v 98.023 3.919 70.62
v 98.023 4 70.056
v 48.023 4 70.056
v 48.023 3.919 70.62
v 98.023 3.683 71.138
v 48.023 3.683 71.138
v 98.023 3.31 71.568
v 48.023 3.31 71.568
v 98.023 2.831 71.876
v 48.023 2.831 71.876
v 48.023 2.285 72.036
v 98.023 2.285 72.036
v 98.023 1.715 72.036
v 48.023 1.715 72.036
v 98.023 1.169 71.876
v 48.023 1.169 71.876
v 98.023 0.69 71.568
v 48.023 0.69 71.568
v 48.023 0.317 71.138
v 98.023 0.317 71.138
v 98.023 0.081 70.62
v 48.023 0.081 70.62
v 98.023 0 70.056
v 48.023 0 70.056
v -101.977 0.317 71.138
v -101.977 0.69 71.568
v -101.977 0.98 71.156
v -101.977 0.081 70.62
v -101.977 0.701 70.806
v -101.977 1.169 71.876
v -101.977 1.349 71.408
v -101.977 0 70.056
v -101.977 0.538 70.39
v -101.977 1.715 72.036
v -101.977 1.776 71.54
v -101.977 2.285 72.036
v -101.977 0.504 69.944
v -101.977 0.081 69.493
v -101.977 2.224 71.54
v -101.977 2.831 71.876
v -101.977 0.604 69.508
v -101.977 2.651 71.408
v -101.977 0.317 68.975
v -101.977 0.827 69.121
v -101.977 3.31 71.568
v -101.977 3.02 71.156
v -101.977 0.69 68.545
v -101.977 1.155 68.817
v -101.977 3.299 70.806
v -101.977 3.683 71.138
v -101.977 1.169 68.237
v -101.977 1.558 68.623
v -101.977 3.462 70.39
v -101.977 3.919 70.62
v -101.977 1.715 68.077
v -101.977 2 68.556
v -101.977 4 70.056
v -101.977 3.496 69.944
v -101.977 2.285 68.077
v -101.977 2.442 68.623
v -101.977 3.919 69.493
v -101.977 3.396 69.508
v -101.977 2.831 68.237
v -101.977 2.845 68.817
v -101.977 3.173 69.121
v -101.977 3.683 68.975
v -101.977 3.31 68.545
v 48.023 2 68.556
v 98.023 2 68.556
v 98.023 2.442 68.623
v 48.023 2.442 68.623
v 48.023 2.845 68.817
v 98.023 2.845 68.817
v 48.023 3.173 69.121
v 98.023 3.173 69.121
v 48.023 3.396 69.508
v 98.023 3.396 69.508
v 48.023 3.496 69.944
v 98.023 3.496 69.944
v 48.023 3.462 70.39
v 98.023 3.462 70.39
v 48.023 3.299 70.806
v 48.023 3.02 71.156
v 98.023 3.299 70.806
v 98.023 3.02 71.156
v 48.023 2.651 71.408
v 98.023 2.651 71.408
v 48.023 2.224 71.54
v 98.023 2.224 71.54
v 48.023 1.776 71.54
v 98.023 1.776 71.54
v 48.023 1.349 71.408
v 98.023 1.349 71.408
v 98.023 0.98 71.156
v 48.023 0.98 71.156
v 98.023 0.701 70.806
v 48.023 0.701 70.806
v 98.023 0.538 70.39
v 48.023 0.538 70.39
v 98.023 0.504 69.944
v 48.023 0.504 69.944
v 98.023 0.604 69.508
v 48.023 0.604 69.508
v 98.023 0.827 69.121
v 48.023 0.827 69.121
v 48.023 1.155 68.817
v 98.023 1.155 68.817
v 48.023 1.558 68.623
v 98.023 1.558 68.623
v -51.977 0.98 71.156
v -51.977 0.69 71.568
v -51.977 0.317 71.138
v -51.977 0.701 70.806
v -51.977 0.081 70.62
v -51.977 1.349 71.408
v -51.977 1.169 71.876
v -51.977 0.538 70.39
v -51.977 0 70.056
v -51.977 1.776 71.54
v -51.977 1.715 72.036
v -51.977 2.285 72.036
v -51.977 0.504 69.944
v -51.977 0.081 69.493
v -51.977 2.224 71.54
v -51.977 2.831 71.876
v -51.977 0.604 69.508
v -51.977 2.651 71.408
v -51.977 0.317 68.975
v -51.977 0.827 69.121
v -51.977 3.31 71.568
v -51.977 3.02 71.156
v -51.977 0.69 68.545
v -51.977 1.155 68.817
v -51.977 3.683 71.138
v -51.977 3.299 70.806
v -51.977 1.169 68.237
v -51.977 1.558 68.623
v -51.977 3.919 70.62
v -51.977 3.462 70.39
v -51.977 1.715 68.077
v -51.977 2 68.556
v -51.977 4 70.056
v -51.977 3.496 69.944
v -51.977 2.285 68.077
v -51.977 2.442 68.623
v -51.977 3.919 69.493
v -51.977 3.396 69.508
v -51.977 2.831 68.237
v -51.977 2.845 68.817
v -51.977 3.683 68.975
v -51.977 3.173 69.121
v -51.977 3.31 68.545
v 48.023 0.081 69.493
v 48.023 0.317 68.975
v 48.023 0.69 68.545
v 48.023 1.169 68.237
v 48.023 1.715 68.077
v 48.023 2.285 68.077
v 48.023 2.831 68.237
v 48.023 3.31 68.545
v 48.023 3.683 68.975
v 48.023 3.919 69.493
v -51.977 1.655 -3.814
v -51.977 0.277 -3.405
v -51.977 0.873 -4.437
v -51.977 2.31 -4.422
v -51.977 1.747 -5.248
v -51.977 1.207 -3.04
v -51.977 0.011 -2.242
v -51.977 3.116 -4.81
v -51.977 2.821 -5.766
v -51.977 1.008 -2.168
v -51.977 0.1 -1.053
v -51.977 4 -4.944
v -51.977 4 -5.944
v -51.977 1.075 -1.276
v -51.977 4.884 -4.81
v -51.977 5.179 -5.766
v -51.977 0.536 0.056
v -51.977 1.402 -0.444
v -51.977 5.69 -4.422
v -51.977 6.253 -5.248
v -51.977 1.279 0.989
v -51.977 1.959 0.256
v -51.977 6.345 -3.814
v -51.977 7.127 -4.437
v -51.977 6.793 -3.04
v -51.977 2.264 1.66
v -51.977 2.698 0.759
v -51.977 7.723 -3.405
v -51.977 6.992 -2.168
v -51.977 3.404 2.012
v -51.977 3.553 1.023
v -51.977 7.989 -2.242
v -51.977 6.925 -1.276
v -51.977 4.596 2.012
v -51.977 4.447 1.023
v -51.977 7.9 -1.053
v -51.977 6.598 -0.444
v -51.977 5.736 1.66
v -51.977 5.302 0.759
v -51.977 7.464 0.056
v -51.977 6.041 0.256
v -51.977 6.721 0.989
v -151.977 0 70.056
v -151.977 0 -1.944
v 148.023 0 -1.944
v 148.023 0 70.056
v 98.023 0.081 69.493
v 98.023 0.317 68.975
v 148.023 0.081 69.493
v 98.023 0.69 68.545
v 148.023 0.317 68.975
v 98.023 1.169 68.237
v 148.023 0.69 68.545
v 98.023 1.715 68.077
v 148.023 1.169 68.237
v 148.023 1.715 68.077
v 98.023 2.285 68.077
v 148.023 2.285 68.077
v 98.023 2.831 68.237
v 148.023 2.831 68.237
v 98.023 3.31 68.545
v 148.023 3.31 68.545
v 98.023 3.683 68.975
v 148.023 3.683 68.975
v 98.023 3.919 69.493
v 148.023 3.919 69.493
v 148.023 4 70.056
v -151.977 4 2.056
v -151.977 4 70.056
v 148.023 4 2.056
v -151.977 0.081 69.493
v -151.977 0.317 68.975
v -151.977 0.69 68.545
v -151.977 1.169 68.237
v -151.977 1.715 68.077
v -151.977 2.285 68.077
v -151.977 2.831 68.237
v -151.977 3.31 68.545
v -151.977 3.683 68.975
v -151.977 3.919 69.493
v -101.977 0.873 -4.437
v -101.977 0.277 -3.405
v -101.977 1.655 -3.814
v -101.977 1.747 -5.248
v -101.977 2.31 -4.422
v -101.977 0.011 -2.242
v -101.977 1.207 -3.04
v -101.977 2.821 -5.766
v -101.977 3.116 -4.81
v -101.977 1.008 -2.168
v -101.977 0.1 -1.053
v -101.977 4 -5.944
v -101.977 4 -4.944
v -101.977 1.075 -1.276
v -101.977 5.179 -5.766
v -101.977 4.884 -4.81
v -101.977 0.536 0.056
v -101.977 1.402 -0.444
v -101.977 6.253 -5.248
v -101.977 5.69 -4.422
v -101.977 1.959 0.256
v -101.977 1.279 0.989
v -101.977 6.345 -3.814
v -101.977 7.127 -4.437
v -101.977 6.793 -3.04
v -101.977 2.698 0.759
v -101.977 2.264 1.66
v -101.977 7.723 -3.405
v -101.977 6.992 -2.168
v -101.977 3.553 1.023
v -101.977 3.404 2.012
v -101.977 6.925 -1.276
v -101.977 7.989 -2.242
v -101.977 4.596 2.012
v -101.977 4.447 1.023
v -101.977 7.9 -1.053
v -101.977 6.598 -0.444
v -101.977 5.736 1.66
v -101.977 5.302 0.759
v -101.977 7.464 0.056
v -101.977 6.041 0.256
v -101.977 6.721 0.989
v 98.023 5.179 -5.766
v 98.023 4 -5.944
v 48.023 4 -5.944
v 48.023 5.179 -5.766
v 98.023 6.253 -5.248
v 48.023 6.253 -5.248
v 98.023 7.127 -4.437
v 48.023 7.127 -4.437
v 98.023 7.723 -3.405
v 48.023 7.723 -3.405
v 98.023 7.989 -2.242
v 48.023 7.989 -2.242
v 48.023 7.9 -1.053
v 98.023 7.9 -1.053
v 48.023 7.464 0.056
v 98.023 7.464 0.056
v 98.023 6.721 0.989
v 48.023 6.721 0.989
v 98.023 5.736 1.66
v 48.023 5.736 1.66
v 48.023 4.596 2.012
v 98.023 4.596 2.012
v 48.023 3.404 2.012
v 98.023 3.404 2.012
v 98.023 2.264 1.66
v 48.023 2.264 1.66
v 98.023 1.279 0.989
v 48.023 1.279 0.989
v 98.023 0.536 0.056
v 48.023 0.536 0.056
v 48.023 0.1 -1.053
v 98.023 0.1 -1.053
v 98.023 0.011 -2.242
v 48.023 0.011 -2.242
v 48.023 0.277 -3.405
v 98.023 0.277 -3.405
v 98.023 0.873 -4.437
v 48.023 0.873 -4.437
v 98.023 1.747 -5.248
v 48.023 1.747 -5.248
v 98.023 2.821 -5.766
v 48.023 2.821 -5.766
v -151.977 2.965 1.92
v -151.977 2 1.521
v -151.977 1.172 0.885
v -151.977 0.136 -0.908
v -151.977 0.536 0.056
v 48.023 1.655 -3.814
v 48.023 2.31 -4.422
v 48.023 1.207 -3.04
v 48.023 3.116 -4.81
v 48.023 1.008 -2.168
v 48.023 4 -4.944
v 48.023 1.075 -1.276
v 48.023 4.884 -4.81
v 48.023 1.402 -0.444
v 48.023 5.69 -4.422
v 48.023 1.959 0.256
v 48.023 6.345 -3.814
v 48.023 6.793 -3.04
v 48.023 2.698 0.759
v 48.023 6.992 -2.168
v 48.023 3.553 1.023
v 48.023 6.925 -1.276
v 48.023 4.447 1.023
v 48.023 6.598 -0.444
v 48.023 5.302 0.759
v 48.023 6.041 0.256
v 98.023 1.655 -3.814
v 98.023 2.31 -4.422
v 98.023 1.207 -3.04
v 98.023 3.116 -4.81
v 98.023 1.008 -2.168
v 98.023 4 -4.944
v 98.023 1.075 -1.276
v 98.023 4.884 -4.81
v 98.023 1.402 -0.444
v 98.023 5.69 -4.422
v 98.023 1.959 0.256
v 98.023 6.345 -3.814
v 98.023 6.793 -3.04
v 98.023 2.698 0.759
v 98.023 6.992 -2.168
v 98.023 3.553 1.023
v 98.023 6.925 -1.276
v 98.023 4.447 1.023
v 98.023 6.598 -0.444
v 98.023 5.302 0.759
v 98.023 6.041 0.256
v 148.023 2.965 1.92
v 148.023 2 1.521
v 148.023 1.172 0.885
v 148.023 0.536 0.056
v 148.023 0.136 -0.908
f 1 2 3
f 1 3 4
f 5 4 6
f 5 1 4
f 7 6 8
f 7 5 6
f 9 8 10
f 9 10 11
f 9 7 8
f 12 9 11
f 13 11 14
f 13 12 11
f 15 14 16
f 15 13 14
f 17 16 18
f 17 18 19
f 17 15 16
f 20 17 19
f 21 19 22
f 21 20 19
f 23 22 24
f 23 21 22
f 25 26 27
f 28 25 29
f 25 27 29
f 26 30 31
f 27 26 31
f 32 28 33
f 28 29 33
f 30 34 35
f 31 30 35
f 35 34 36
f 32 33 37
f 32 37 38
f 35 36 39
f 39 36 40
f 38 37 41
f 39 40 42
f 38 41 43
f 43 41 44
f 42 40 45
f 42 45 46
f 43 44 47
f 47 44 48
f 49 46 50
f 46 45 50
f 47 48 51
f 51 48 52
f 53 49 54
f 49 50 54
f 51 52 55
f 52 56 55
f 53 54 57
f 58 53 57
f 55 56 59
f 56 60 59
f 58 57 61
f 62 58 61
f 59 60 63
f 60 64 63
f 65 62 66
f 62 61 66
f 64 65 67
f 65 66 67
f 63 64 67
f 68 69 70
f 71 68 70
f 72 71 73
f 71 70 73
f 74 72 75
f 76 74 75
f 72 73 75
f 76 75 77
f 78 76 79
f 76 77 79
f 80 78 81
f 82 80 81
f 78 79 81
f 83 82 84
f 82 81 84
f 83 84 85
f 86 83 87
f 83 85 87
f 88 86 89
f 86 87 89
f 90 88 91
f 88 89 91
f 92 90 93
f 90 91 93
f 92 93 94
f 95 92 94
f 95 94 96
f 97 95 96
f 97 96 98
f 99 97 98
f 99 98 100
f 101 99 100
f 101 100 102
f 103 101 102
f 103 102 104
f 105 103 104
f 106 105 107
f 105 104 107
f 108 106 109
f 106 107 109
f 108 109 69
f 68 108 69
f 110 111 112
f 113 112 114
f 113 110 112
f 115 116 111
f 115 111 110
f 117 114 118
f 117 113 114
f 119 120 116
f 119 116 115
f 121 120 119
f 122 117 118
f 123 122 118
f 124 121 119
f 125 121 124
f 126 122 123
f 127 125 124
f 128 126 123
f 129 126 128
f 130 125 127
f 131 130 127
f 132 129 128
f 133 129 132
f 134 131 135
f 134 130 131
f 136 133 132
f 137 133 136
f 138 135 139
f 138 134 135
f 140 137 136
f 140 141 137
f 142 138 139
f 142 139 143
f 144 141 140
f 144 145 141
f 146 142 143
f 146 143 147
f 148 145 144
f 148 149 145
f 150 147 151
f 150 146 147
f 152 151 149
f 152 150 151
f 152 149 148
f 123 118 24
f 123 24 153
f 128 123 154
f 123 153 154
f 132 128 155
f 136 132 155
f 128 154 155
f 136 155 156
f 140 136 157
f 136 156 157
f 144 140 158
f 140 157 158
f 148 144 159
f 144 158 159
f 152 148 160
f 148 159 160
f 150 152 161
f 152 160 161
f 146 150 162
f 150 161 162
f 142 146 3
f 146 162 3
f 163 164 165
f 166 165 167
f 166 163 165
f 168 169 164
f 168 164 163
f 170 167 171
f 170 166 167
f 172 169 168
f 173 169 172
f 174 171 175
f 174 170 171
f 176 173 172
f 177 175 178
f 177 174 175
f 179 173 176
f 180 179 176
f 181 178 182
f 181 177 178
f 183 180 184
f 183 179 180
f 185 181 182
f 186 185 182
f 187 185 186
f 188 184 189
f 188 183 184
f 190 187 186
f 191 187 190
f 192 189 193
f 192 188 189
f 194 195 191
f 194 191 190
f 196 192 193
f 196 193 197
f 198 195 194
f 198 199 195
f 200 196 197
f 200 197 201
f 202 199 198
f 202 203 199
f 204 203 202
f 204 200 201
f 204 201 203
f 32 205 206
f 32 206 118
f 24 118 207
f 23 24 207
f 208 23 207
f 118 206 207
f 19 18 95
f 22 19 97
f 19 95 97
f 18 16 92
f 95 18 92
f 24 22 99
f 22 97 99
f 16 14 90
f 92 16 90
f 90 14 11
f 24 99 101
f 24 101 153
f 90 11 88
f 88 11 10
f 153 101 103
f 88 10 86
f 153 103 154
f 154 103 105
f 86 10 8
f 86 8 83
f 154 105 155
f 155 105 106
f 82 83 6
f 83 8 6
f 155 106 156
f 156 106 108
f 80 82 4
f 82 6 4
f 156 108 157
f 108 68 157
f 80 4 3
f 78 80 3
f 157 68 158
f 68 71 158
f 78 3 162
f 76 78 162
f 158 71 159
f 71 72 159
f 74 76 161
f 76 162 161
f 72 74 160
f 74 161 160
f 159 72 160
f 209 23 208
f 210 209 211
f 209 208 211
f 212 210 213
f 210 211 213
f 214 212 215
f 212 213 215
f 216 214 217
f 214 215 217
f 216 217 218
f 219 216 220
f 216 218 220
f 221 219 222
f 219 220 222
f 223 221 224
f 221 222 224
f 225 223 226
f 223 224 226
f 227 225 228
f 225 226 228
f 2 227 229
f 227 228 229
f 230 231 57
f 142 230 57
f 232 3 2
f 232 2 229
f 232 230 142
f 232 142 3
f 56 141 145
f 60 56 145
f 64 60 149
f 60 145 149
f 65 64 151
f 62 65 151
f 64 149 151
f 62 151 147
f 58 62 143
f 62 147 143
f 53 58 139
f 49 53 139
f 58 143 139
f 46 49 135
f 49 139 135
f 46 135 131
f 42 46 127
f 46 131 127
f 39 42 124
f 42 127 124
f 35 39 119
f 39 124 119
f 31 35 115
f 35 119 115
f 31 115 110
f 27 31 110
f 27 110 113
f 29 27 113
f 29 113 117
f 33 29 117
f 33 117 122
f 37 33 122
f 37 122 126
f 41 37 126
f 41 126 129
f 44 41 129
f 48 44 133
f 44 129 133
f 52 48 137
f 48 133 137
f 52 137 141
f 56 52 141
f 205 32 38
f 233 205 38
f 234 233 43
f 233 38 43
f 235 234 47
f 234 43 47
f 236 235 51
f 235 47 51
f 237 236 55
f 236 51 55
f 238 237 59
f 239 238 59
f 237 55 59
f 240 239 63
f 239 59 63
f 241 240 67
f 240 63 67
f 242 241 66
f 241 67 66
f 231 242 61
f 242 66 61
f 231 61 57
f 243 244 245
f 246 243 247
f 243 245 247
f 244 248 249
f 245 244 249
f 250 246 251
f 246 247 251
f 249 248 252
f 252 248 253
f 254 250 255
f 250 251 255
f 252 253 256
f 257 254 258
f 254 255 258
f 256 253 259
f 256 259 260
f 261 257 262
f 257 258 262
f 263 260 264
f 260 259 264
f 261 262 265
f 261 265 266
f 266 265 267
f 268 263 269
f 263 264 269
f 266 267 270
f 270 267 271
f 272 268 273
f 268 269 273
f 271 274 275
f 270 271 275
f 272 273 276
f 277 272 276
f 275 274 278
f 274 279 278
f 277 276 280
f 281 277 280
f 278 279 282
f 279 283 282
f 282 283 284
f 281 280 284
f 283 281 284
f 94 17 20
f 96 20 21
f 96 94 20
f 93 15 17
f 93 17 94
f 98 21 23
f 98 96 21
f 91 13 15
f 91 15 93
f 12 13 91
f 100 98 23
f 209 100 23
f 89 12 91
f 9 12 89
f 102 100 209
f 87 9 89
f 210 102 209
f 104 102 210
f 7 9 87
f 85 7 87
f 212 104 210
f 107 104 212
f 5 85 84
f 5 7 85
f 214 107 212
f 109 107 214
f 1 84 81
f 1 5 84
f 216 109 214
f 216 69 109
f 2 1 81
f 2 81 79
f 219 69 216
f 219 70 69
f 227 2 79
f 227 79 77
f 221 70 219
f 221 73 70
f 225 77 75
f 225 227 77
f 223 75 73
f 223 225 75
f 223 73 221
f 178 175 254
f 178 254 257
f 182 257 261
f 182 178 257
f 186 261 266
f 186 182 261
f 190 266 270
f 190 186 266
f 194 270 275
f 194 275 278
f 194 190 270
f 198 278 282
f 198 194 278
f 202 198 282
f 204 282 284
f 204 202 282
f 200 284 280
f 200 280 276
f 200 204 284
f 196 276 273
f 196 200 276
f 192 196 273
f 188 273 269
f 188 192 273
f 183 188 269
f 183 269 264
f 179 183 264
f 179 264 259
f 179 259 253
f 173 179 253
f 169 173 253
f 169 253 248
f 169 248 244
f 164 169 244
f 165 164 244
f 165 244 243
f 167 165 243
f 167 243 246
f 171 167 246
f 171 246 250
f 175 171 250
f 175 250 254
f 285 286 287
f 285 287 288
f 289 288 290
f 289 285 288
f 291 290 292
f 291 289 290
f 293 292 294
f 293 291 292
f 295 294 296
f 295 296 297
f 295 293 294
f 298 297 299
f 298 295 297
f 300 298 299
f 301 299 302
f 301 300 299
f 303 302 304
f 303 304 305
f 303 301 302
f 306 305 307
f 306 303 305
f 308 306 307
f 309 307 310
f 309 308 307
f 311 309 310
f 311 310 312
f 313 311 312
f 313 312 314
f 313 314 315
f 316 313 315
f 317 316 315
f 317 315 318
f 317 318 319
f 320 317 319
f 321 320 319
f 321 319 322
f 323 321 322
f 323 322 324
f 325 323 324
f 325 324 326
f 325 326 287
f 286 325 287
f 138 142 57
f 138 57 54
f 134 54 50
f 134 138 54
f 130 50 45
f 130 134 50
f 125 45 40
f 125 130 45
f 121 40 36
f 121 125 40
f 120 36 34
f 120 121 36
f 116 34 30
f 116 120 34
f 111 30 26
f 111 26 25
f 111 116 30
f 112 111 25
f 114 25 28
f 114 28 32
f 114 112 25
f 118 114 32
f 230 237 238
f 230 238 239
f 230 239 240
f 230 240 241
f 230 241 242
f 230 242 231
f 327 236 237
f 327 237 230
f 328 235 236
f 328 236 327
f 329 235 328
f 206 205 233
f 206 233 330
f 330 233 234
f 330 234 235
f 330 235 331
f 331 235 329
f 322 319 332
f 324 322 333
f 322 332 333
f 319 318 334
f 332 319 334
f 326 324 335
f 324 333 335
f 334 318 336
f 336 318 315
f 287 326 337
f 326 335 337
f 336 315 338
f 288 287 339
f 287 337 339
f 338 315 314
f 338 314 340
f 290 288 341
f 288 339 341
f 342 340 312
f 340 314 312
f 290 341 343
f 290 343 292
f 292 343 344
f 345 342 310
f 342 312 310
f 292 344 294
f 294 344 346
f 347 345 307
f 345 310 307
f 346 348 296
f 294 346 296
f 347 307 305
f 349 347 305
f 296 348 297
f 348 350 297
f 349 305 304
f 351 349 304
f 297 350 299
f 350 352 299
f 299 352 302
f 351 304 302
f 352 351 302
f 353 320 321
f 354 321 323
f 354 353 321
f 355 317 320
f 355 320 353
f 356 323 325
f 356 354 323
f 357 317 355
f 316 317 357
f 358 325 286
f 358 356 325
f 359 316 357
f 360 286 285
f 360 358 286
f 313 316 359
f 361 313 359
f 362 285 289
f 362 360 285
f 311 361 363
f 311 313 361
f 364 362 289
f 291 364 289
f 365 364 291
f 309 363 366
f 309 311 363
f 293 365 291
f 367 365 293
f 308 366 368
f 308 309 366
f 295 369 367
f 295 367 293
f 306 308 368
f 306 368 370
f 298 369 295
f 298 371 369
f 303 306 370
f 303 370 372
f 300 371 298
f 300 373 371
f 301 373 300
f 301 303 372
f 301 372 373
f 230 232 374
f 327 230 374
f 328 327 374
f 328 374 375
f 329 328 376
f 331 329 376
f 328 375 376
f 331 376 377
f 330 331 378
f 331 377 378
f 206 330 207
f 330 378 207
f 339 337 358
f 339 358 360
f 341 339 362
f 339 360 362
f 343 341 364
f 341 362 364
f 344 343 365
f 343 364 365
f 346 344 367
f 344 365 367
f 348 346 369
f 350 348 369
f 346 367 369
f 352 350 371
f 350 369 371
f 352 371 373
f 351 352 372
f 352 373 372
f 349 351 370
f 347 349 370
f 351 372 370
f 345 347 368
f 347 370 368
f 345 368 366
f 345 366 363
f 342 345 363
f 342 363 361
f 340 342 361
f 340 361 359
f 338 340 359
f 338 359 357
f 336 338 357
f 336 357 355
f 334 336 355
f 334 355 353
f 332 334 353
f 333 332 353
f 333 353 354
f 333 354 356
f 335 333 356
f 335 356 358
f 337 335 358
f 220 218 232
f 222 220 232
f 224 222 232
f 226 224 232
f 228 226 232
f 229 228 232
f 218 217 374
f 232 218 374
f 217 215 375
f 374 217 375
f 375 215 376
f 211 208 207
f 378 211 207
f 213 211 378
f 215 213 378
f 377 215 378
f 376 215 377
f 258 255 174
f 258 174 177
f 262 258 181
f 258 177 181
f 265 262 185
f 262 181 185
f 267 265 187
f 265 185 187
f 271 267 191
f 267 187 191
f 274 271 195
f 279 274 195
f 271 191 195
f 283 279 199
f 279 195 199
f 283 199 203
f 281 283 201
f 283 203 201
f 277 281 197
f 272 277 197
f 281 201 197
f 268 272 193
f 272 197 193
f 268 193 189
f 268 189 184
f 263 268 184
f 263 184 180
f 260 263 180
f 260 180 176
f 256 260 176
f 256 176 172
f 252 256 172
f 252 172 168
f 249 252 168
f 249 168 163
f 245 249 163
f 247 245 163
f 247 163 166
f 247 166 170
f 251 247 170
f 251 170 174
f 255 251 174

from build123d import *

# Parameters (mm, degrees)
SKETCH_1_W                   = 300
SKETCH_1_H                   = 72
EXTRUDE_1_DEPTH              = 4
SKETCH_2_R                   = 4
CUT_EXTRUDE_1_DEPTH          = 300
SKETCH_3_R                   = 4
SKETCH_3_R_2                 = 3
EXTRUDE_1_2_DEPTH            = 300
SPLIT_START                  = -51.97740113
SPLIT_BODIES_1_OUTLINE_R     = 4
SPLIT_BODIES_1_OUTLINE_R_2   = 3
SPLIT_BODIES_1_DEPTH         = 100
SPLIT_START_2                = -151.97740113
SPLIT_BODIES_1_2_OUTLINE_R   = 4
SPLIT_BODIES_1_2_OUTLINE_R_2 = 3
SPLIT_BODIES_1_2_DEPTH       = 50
SPLIT_START_3                = 98.02259887
SPLIT_BODIES_1_3_OUTLINE_R   = 4
SPLIT_BODIES_1_3_OUTLINE_R_2 = 3
SPLIT_BODIES_1_3_DEPTH       = 50
SKETCH_7_R                   = 2
CUT_EXTRUDE_2_DEPTH          = 309.175133319
EXTRUDE_START                = 50
SKETCH_8_R                   = 2
SKETCH_8_R_2                 = 1.5
EXTRUDE_3_DEPTH              = 50
SKETCH_10_R                  = 2
SKETCH_10_R_2                = 1.5
EXTRUDE_4_DEPTH              = 50


# Read off the part's stored shape, not the designer's step: 分割1
with BuildPart() as part:
    # 草图1 → Extrude 1 (new body)
    with BuildSketch(Plane(origin=(0, 0, 0), x_dir=(1, 0, 0), z_dir=(0, 1, 0))):
        with Locations((-1.97740113, -34.056497175)):
            Rectangle(SKETCH_1_W, SKETCH_1_H)
    extrude(amount=EXTRUDE_1_DEPTH)

    # 草图2 → 切除-拉伸1 (cut)
    with BuildSketch(Plane(origin=(148.02259887, 0, 0), x_dir=(0, 0, -1), z_dir=(1, 0, 0))):
        with Locations((1.943502825, 4)):
            Circle(SKETCH_2_R)
    extrude(amount=-CUT_EXTRUDE_1_DEPTH, mode=Mode.SUBTRACT)

    # 草图7 → 切除-拉伸2 (cut, through all)
    with BuildSketch(Plane(origin=(148.02259887, 0, 0), x_dir=(0, 0, -1), z_dir=(1, 0, 0))):
        with Locations((-70.056497175, 2)):
            Circle(SKETCH_7_R)
    extrude(amount=-CUT_EXTRUDE_2_DEPTH, mode=Mode.SUBTRACT)

    # 草图8 → 拉伸-薄壁3 (add)
    with BuildSketch(Plane(origin=(-101.97740113, 0, 0), x_dir=(0, 0, -1), z_dir=(1, 0, 0)).offset(EXTRUDE_START)):
        with Locations((-70.056497175, 2)):
            Circle(SKETCH_8_R)
        with Locations((-70.056497175, 2)):
            Circle(SKETCH_8_R_2, mode=Mode.SUBTRACT)
    extrude(amount=-EXTRUDE_3_DEPTH)

    # 草图10 → 拉伸-薄壁4 (add)
    with BuildSketch(Plane(origin=(98.02259887, 0, 0), x_dir=(0, 0, -1), z_dir=(1, 0, 0))):
        with Locations((-70.056497175, 2)):
            Circle(SKETCH_10_R)
        with Locations((-70.056497175, 2)):
            Circle(SKETCH_10_R_2, mode=Mode.SUBTRACT)
    extrude(amount=-EXTRUDE_4_DEPTH)


with BuildPart() as body_2:
    # 草图3 → Extrude 1 2 (new body)
    with BuildSketch(Plane(origin=(148.02259887, 0, 0), x_dir=(0, 0, -1), z_dir=(1, 0, 0))):
        with Locations((1.943502825, 4)):
            Circle(SKETCH_3_R)
        with Locations((1.943502825, 4)):
            Circle(SKETCH_3_R_2, mode=Mode.SUBTRACT)
    extrude(amount=-EXTRUDE_1_2_DEPTH)

    # Split Bodies 1 outline → Split Bodies 1 (cut)
    with BuildSketch(Plane.YZ.offset(SPLIT_START)):
        with Locations((4, -1.943502825)):
            Circle(SPLIT_BODIES_1_OUTLINE_R)
        with Locations((4, -1.943502825)):
            Circle(SPLIT_BODIES_1_OUTLINE_R_2, mode=Mode.SUBTRACT)
    extrude(amount=SPLIT_BODIES_1_DEPTH, mode=Mode.SUBTRACT)

    # Split Bodies 1 2 outline → Split Bodies 1 2 (cut)
    with BuildSketch(Plane.YZ.offset(SPLIT_START_2)):
        with Locations((4, -1.943502825)):
            Circle(SPLIT_BODIES_1_2_OUTLINE_R)
        with Locations((4, -1.943502825)):
            Circle(SPLIT_BODIES_1_2_OUTLINE_R_2, mode=Mode.SUBTRACT)
    extrude(amount=SPLIT_BODIES_1_2_DEPTH, mode=Mode.SUBTRACT)

    # Split Bodies 1 3 outline → Split Bodies 1 3 (cut)
    with BuildSketch(Plane.YZ.offset(SPLIT_START_3)):
        with Locations((4, -1.943502825)):
            Circle(SPLIT_BODIES_1_3_OUTLINE_R)
        with Locations((4, -1.943502825)):
            Circle(SPLIT_BODIES_1_3_OUTLINE_R_2, mode=Mode.SUBTRACT)
    extrude(amount=SPLIT_BODIES_1_3_DEPTH, mode=Mode.SUBTRACT)


solid = Compound([part.part, body_2.part])
